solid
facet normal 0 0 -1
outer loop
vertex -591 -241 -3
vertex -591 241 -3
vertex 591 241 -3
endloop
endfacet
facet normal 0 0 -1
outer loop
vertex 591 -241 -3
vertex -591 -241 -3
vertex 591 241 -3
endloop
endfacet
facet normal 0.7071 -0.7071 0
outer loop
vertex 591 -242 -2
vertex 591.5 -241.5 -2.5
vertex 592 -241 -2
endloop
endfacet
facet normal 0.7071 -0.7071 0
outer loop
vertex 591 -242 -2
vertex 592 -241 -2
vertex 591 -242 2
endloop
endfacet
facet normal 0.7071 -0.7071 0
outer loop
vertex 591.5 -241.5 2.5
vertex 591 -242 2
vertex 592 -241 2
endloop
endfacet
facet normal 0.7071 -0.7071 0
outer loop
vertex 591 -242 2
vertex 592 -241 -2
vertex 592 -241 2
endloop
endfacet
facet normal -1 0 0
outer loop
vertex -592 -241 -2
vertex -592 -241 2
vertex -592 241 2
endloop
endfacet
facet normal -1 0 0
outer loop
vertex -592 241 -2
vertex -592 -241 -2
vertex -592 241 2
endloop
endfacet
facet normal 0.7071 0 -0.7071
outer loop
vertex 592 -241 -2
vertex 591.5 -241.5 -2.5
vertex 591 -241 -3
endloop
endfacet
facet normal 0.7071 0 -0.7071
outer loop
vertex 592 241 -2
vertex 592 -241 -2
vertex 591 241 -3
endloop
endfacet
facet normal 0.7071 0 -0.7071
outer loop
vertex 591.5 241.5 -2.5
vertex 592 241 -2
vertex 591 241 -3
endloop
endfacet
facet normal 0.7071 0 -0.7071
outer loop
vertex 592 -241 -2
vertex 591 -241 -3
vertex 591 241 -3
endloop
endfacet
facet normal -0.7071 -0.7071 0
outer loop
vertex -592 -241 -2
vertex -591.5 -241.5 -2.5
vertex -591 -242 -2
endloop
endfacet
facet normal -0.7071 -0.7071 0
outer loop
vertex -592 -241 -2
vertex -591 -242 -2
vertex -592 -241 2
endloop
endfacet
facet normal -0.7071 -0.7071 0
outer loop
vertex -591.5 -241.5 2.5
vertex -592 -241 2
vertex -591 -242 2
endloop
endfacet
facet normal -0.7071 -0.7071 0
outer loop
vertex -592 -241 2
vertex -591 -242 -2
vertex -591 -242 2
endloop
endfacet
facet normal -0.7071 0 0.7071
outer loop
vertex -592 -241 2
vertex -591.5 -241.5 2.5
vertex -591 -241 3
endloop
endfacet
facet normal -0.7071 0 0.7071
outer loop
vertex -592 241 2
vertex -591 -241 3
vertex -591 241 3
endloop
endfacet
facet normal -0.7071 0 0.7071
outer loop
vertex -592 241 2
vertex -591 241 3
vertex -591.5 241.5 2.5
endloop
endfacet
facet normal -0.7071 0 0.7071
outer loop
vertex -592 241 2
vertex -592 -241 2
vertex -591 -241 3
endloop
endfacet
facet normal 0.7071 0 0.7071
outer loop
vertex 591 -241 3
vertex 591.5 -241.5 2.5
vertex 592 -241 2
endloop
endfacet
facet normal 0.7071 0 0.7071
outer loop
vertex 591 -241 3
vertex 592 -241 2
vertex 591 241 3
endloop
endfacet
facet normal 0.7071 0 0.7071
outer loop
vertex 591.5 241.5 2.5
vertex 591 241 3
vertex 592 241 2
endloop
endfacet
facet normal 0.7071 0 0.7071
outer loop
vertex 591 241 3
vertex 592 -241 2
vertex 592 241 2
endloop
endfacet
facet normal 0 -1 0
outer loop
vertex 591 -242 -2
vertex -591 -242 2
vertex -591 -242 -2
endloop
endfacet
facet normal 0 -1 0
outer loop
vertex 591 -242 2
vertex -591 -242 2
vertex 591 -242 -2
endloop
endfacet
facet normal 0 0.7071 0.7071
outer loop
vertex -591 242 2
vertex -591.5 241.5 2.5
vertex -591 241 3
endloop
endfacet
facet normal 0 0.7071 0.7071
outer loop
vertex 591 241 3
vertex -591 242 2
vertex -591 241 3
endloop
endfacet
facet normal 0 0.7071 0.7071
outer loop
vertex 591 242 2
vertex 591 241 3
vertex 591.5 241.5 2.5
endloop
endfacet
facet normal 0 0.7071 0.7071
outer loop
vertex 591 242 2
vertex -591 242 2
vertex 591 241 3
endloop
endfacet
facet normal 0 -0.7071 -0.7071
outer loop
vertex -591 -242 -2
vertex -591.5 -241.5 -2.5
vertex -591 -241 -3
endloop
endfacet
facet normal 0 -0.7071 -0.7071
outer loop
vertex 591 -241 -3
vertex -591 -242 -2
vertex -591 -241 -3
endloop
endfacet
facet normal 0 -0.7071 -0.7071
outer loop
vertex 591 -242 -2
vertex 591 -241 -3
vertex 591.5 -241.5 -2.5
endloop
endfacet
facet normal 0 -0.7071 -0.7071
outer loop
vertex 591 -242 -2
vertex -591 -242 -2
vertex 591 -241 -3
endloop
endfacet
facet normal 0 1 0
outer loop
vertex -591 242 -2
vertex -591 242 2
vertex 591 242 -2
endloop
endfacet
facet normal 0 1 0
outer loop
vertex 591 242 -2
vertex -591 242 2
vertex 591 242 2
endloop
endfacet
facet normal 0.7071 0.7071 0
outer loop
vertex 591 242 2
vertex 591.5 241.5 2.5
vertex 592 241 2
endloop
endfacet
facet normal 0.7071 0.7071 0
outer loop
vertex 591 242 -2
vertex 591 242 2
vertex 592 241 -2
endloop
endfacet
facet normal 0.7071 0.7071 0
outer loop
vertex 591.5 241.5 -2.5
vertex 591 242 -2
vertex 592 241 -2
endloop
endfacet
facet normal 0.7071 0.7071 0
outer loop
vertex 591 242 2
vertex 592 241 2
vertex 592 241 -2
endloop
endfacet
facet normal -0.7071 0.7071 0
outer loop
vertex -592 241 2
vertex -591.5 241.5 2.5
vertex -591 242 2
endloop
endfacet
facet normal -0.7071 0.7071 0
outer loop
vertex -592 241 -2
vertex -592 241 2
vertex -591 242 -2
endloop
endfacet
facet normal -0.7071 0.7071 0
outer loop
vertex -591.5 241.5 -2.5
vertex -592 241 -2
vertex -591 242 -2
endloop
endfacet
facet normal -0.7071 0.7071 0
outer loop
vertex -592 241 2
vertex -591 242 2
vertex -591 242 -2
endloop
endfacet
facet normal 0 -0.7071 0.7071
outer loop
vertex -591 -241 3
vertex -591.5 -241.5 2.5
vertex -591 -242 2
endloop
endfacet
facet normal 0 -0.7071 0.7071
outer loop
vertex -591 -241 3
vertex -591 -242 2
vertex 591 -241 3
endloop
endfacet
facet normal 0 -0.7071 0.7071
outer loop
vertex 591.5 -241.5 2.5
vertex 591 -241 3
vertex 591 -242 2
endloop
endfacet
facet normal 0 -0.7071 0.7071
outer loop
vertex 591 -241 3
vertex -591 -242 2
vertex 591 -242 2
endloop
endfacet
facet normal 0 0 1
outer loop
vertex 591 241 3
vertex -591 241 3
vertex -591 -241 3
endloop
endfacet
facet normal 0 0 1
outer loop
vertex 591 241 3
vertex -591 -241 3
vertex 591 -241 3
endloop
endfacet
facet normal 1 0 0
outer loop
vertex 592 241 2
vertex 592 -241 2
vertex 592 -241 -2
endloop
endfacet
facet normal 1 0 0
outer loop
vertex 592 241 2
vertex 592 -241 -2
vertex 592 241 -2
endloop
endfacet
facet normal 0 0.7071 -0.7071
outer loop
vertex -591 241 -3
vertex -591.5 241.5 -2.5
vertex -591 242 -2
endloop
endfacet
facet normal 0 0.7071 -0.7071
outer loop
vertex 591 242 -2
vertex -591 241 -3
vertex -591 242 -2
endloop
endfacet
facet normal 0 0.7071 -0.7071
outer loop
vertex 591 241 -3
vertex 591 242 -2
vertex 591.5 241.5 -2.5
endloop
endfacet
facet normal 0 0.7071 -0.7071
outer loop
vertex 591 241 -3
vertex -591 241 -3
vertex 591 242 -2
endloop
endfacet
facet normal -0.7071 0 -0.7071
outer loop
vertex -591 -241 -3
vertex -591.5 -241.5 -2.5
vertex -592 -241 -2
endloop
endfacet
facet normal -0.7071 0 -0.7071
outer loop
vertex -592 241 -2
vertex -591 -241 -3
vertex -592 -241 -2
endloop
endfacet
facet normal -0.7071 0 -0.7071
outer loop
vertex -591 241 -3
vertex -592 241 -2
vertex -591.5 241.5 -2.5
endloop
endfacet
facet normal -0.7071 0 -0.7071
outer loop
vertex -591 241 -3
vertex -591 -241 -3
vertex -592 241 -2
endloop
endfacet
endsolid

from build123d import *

# Parameters (mm, degrees)
F0_W     = 1184
F0_H     = 484
F1_DEPTH = 3
F2_SIZE  = 1
F3_SIZE  = 1
F4_SIZE  = 1
F5_SIZE  = 1
F6_SIZE  = 1
F7_SIZE  = 1


with BuildPart() as f1:
    # F0 (on Top) → F1 (new body, symmetric)
    with BuildSketch(Plane.XY):
        Rectangle(F0_W, F0_H)
    extrude(amount=F1_DEPTH, both=True)

    # F2
    f2_edges = [f1.edges().sort_by_distance(p)[0] for p in [
        (592, 0, -3),
        (0, -242, -3),
        (-592, 0, -3),
        (0, 242, -3),
    ]]
    chamfer(f2_edges, length=F2_SIZE)

    # F3
    f3_edges = [f1.edges().sort_by_distance(p)[0] for p in [
        (592, -242, 0.5),
    ]]
    chamfer(f3_edges, length=F3_SIZE)

    # F4
    f4_edges = [f1.edges().sort_by_distance(p)[0] for p in [
        (-592, 242, 0.5),
    ]]
    chamfer(f4_edges, length=F4_SIZE)

    # F5
    f5_edges = [f1.edges().sort_by_distance(p)[0] for p in [
        (-592, -242, 0.5),
    ]]
    chamfer(f5_edges, length=F5_SIZE)

    # F6
    f6_edges = [f1.edges().sort_by_distance(p)[0] for p in [
        (592, 242, 0.5),
    ]]
    chamfer(f6_edges, length=F6_SIZE)

    # F7 (call 1 of 4: OpenCascade refuses the feature's edges together)
    f7_edges = [f1.edges().sort_by_distance(p)[0] for p in [
        (0, -242, 3),
    ]]
    chamfer(f7_edges, length=F7_SIZE)

    # F7#2 (call 2 of 4)
    f7_2_edges = [f1.edges().sort_by_distance(p)[0] for p in [
        (592, 0, 3),
    ]]
    chamfer(f7_2_edges, length=F7_SIZE)

    # F7#3 (call 3 of 4)
    f7_3_edges = [f1.edges().sort_by_distance(p)[0] for p in [
        (0, 242, 3),
    ]]
    chamfer(f7_3_edges, length=F7_SIZE)

    # F7#4 (call 4 of 4)
    f7_4_edges = [f1.edges().sort_by_distance(p)[0] for p in [
        (-592, 0, 3),
    ]]
    chamfer(f7_4_edges, length=F7_SIZE)


solid = f1.part
